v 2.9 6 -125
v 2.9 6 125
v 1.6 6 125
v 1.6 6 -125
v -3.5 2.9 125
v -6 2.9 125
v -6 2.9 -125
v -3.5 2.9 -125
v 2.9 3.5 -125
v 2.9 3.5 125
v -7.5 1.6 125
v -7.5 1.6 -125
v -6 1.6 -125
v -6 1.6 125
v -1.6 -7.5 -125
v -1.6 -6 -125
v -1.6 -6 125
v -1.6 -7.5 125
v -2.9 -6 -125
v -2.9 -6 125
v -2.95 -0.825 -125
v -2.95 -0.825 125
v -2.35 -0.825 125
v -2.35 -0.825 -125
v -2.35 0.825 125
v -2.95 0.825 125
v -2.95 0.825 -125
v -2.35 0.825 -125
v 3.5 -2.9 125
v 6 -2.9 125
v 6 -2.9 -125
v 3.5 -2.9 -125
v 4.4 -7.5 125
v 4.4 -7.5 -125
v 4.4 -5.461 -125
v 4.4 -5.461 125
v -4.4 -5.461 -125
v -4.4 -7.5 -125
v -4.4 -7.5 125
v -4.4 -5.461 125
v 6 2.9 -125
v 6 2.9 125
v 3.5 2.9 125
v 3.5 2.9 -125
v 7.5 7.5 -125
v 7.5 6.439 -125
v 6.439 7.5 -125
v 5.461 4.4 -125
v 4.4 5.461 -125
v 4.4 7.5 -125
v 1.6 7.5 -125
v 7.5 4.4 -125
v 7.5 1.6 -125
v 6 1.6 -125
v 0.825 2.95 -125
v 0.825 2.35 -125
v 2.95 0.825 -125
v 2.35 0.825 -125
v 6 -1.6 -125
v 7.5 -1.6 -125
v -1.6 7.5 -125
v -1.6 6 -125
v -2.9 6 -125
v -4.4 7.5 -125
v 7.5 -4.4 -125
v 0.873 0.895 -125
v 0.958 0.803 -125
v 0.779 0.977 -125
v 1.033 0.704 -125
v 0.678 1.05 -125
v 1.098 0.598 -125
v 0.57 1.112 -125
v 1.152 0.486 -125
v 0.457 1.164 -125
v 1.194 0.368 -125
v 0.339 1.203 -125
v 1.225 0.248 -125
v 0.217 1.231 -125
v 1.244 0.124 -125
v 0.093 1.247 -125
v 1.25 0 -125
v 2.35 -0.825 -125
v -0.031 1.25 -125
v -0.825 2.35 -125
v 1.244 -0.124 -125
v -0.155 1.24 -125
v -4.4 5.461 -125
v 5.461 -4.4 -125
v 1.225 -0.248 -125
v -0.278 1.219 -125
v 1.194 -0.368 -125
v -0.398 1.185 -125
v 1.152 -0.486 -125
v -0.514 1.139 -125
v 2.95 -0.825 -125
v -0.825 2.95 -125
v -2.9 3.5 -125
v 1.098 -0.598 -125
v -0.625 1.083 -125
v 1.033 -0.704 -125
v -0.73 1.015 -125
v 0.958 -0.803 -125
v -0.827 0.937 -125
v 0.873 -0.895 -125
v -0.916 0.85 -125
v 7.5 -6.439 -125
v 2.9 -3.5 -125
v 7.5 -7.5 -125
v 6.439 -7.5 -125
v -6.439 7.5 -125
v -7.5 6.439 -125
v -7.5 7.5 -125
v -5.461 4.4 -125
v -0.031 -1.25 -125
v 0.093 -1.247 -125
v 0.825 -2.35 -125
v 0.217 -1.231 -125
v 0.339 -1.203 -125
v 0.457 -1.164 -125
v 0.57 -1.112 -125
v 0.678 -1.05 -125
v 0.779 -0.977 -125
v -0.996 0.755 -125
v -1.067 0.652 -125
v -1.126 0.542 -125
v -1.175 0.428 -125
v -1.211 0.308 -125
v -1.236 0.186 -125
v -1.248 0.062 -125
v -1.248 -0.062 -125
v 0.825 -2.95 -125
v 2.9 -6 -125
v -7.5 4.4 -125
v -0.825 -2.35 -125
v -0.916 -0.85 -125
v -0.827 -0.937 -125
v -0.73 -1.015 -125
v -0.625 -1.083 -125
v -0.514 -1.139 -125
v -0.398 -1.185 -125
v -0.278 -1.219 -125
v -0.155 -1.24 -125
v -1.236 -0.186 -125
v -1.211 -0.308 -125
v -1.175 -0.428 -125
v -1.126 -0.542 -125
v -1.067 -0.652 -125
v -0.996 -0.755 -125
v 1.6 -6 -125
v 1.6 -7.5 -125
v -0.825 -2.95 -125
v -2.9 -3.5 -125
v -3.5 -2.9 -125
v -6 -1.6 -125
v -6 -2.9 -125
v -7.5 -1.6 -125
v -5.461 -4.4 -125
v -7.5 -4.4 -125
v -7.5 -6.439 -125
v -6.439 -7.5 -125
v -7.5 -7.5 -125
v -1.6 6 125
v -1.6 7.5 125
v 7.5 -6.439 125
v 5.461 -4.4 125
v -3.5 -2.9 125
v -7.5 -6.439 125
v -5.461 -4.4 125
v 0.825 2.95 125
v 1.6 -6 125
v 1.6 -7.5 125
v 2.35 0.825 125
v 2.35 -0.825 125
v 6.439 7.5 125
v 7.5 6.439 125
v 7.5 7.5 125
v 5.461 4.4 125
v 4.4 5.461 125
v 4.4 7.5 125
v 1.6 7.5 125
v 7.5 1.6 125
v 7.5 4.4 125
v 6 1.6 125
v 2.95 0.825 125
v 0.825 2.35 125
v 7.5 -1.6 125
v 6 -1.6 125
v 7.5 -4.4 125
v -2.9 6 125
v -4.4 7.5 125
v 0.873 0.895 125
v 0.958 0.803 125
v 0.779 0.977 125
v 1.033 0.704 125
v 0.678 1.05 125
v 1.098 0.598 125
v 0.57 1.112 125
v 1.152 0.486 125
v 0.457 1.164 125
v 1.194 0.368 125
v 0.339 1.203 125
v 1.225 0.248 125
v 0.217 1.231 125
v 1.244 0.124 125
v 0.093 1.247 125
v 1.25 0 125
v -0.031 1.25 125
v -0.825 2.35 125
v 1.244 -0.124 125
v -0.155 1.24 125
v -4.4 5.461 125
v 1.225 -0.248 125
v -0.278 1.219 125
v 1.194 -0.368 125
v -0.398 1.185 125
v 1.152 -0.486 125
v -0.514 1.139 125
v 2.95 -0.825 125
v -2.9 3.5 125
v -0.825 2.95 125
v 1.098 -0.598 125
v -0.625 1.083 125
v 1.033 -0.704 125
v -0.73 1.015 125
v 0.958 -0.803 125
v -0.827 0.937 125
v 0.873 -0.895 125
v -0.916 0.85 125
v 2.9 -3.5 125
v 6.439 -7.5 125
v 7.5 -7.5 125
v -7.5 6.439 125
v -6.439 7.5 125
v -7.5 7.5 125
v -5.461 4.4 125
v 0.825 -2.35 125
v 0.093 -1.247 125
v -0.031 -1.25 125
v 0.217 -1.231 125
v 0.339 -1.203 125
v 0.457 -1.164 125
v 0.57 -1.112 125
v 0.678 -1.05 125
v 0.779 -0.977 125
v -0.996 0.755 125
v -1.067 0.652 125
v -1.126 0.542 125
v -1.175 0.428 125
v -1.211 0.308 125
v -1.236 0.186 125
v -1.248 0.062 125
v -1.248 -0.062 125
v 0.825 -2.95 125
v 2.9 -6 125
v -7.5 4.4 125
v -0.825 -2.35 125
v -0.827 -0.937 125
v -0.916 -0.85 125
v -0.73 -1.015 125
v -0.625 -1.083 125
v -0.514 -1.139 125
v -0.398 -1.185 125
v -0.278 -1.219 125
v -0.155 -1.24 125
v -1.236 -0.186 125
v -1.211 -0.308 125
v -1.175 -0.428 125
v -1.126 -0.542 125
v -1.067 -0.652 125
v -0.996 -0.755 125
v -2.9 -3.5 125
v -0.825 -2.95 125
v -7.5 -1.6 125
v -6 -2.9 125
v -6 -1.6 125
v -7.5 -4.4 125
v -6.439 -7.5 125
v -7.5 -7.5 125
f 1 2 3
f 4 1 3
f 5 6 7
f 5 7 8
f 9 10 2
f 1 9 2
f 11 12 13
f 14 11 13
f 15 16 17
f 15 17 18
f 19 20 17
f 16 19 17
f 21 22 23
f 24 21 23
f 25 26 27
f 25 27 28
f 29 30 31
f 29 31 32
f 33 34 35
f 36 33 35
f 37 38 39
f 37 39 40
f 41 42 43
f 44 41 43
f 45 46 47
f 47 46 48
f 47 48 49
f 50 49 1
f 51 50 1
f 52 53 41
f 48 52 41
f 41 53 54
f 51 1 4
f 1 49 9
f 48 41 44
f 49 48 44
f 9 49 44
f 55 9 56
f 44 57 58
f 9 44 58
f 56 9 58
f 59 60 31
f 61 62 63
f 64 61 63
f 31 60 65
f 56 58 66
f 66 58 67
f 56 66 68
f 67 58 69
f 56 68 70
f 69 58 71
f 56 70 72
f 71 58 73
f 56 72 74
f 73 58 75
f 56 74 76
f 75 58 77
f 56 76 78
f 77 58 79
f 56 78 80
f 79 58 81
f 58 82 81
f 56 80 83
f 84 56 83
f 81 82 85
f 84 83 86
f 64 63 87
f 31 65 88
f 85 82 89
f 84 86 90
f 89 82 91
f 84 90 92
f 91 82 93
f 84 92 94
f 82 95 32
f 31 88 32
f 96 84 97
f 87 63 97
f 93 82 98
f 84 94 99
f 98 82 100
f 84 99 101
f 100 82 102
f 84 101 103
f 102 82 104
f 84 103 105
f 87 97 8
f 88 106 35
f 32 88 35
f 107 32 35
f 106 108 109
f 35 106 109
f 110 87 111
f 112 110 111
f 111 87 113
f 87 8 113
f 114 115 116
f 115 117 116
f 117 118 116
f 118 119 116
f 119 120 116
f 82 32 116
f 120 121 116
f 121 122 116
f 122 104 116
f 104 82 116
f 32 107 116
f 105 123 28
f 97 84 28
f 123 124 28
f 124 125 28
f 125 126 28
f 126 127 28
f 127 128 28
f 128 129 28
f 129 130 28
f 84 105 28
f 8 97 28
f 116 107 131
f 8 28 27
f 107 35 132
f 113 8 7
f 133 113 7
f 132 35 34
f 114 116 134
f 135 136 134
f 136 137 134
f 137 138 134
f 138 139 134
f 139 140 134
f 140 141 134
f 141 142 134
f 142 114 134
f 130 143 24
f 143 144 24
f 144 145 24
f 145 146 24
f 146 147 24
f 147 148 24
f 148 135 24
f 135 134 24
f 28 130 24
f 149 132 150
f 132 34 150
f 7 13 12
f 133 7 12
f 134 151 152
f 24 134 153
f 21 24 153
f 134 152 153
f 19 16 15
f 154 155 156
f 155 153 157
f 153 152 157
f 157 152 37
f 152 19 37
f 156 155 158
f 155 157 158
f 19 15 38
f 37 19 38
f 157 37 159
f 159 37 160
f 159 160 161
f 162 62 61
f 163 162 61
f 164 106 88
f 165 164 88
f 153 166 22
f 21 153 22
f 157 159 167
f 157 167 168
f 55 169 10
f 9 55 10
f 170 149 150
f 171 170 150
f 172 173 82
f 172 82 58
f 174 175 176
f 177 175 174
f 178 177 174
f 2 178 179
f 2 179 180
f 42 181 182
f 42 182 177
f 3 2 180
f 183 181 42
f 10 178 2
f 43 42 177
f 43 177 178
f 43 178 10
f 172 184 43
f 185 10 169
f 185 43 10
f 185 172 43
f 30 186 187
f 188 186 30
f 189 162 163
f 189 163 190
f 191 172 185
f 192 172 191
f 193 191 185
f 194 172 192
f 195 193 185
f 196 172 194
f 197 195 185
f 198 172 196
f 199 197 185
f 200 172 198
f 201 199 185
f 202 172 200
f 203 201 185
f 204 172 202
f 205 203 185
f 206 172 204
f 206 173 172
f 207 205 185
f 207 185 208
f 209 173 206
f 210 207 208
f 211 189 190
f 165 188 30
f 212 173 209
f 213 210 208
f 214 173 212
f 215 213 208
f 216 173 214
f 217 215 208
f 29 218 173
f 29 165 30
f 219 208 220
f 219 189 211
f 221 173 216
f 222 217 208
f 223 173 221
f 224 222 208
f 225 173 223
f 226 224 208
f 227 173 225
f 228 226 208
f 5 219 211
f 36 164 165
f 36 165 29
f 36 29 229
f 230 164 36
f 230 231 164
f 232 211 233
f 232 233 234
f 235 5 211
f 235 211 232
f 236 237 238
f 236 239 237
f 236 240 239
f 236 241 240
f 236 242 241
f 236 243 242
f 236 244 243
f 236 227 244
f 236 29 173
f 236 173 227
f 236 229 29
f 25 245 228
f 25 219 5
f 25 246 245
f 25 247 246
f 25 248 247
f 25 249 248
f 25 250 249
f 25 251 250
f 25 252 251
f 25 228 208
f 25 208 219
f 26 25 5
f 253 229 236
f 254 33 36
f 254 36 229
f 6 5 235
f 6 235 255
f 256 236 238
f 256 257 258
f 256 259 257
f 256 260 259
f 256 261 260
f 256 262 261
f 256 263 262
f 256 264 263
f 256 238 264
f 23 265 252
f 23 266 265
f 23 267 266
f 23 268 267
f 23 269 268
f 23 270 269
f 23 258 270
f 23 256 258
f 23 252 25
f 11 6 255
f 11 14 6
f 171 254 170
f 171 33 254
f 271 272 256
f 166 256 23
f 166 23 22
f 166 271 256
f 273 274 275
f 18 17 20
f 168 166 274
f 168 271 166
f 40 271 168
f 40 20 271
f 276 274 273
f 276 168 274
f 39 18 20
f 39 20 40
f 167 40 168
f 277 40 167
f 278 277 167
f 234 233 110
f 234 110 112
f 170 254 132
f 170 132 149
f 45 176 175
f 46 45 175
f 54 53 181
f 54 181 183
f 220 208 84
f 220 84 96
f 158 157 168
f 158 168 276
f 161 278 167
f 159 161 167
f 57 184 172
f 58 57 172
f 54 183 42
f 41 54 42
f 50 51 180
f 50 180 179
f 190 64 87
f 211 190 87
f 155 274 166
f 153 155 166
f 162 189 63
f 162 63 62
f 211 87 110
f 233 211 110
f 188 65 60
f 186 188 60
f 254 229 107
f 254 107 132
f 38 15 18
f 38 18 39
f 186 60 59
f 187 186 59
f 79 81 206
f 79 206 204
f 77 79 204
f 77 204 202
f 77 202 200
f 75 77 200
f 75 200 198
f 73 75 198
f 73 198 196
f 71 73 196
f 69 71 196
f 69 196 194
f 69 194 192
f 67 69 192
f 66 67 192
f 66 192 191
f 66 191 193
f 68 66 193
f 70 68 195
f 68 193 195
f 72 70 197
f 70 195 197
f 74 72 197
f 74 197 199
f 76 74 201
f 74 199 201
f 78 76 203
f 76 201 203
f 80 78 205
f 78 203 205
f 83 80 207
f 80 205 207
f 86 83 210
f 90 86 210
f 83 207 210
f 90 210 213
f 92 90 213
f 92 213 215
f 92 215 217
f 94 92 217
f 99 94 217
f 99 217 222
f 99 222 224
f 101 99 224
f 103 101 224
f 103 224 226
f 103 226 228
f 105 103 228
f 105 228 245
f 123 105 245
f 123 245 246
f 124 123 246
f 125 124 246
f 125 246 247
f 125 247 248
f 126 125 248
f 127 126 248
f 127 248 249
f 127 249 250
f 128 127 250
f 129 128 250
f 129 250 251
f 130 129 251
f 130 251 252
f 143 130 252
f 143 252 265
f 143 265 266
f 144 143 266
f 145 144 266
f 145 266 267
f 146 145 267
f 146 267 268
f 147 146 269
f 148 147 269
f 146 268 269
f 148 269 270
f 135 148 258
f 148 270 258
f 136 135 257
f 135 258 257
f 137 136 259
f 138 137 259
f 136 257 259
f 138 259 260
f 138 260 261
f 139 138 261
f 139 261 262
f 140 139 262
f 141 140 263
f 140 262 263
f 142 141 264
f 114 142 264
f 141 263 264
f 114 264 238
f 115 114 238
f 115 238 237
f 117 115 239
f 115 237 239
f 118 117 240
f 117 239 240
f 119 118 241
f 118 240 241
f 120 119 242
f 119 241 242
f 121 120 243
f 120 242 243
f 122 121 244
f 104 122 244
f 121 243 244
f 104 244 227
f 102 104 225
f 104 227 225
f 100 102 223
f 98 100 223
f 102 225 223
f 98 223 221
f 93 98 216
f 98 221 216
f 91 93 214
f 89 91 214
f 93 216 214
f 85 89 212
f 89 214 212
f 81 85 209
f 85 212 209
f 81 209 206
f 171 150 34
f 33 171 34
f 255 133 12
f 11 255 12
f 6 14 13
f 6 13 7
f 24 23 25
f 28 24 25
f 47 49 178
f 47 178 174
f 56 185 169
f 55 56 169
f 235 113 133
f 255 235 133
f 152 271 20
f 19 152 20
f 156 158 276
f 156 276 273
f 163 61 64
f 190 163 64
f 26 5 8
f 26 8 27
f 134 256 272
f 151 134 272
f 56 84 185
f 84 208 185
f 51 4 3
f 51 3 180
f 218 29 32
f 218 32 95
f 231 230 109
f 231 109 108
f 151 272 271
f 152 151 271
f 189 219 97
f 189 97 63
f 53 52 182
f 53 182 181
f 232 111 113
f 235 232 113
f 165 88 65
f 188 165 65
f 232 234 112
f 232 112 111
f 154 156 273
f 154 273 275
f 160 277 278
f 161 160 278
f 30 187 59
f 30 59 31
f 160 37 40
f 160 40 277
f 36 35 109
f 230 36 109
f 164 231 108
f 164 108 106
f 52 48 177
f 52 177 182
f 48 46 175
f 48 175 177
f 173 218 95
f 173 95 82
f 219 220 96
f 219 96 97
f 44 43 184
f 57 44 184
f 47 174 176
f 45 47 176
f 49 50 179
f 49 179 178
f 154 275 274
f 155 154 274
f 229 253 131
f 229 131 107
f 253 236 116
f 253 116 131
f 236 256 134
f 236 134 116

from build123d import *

# Parameters (mm, degrees)
RESSALTO_EXTRUS_O1_DEPTH   = 125
ESPELHAR2_COPY_1_DEPTH     = 125
ESBO_O2_R                  = 1.25
CORTE_EXTRUS_O1_DEPTH      = 1
CORTE_EXTRUS_O1_DEPTH_BACK = 251


with BuildPart() as part:
    # Esboço1 → Ressalto-extrusão1 (new body, symmetric)
    with BuildSketch(Plane.XY):
        Polygon((0, 2.35), (-0.825, 2.35), (-0.825, 2.95), (-2.9, 3.5), (-2.9, 6), (-1.6, 6), (-1.6, 7.5), (-4.4, 7.5), (-4.4, 5.460660172), (-6.439339828, 7.5), (-7.5, 7.5), (-7.5, 6.439339828), (-5.460660172, 4.4), (-7.5, 4.4), (-7.5, 1.6), (-6, 1.6), (-6, 2.9), (-3.5, 2.9), (-2.95, 0.825), (-2.35, 0.825), (-2.35, 0), (0, 0), align=None)
    ressalto_extrus_o1 = extrude(amount=RESSALTO_EXTRUS_O1_DEPTH, both=True)

    # Espelhar1: Ressalto-extrusão1 across plane
    add(ressalto_extrus_o1.mirror(Plane.ZX))

    # Espelhar2: Ressalto-extrusão1 across plane
    add(ressalto_extrus_o1.mirror(Plane(origin=(0, 0, 0), x_dir=(0, 0, 1), z_dir=(1, 0, 0))))

    # Espelhar2 copy 1 sketch → Espelhar2 copy 1 (add, symmetric)
    with BuildSketch(Plane(origin=(0, 0, 0), x_dir=(-1, 0, 0), z_dir=(0, 0, 1))):
        Polygon((0, 2.35), (-0.825, 2.35), (-0.825, 2.95), (-2.9, 3.5), (-2.9, 6), (-1.6, 6), (-1.6, 7.5), (-4.4, 7.5), (-4.4, 5.460660172), (-6.439339828, 7.5), (-7.5, 7.5), (-7.5, 6.439339828), (-5.460660172, 4.4), (-7.5, 4.4), (-7.5, 1.6), (-6, 1.6), (-6, 2.9), (-3.5, 2.9), (-2.95, 0.825), (-2.35, 0.825), (-2.35, 0), (0, 0), align=None)
    extrude(amount=ESPELHAR2_COPY_1_DEPTH, both=True)

    # Esboço2 → Corte-extrusão1 (cut, two sides)
    with BuildSketch(Plane.XY.offset(125)) as corte_extrus_o1_sk:
        Circle(ESBO_O2_R)
    extrude(amount=CORTE_EXTRUS_O1_DEPTH, mode=Mode.SUBTRACT)
    extrude(corte_extrus_o1_sk.sketch, amount=-CORTE_EXTRUS_O1_DEPTH_BACK, mode=Mode.SUBTRACT)


solid = part.part
